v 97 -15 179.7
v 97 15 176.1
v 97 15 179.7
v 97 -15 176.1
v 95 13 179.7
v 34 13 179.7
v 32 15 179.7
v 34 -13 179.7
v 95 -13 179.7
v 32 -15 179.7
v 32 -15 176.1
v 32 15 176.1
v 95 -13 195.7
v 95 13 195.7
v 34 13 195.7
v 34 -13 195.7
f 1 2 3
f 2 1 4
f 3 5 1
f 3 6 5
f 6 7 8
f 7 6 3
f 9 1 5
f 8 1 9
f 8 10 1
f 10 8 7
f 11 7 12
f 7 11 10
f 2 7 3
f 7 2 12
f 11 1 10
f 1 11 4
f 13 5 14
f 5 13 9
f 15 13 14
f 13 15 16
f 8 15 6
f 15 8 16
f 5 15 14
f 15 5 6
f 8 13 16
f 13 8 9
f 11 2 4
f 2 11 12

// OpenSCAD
// file: ../md_vitamins.scad
// Envelopes of the bought electronics, placed where the parts expect them (for fit checks and renders)
SG90_STL = "/Users/hemangvora/OpenDuck/upstream/Open_Duck_Mini/mini_bdx/robots/open_duck_mini_v2/sg90.stl";
module v_sg90_jaw() multmatrix([[1,0,0,JAW_P[0]-5.7],[0,0,-1,-SG_BASE],[0,1,0,JAW_P[1]],[0,0,0,1]]) import(SG90_STL);
module v_radxa() {                         // Radxa Zero 3W 65 x 30 board on 6 mm standoffs + 16 mm component/wire budget
    translate([RADXA_X0, RADXA_Y0, CH_Z1 + 6]) { cube([65, 30, 1.6]); translate([2, 2, 1.6]) cube([61, 26, 16]); translate([0, 0, -2]) cube([65, 30, 2]); }
}
module v_buck() translate([-30, -13.5, CH_Z1 + 1]) cube([46, 27, 12]);            // XY-3606 (HW-688), generous envelope
module v_camera() translate([103.8, -12.5, EYE_C[1] - 14.5]) { cube([1.0, 25, 24]); translate([1.0, 12.5 - 4.25, 14.5 - 4.25]) cube([5.2, 8.5, 8.5]); }  // Pi cam v2 / IMX219 board + lens module
module v_tof() translate([103.8, -6.5, TOF_C[1] - 6.5]) { cube([1.0, 13, 13]); translate([1.0, 6.5 - 3.2, 6.5 - 1.5]) cube([1.75, 6.4, 3.0]); }
module head_vitamins() { v_sg90_jaw(); v_radxa(); v_buck(); v_camera(); v_tof(); }

// ---------------- body electronics ----------------
module v_pack()    translate([DK_X0, -PACK[1] / 2, DK_Z1]) cube(PACK);                       // 3S1P Samsung 30Q pack
module v_bms()     translate([DK_X0 + 5, -31, DK_Z1 + PACK[2] + 0.5]) cube([48, 62, 7]);      // 3S 40 A BMS, 5-FET board
module v_adapter() translate([-44, -21, SHELF[4] + 4]) { cube([33, 42, 1.6]); translate([1, 1, 1.6]) cube([31, 40, 10]); }   // Bus Servo Adapter (A)
module v_switch()  {   // AUTO MT 12 V 20 A toggle, 12 mm hole; body 28 x 16 behind the panel, cover outside
    translate([DK_X0, SWITCH_C[0] - 14, SWITCH_C[1] - 8]) cube([45, 28, 16]);
    translate([BX_R - 25, SWITCH_C[0] - 14, SWITCH_C[1] - 8]) cube([25, 28, 16]);
}
module v_xt30()    translate([DK_X0, XT30_C[0] - 5.1, XT30_C[1] - 2.6]) cube([16, 10.2, 5.2]);
module v_balance() translate([DK_X0, BAL_C[0] - 6.2, BAL_C[1] - 2.9]) cube([8, 12.4, 5.8]);
module v_caps()    for (y = [26, 33]) translate([-40, y, SHELF[4] + 5.3]) rotate([0, 90, 0]) cylinder(d = 10.2, h = 21);  // 2 x 1000 uF 25 V lying on the shelf
module body_vitamins() { v_pack(); v_bms(); v_adapter(); v_switch(); v_xt30(); v_balance(); v_caps(); }
// file: ../md_params.scad
// =====================================================================
//  Microduck-look skin for the Open Duck Mini v2 skeleton
//  Shared parameters and helpers.
//  Frame: Open Duck print/robot frame, mm. +x forward, +y left, +z up.
//  Every part is modelled where it sits on the robot (zero pose).
// =====================================================================

$fn = 72;
EPS = 0.01;

// ---------- fasteners ----------
INSERT_D   = 4.0;   // hole for M3 x 5 brass heat-set insert (Amazon B0DZ8B7FW1)
INSERT_L   = 6.0;   // hole depth for that insert
M3_CLR     = 3.4;   // M3 clearance
M3_HEAD    = 6.5;   // M3 socket-head counterbore
M3_NUT     = 6.4;   // M3 nut across corners (+clearance)
M2_TAP     = 1.8;   // M2 self-tapping pilot (SG90 tab screws, servo adapter)
M25_TAP    = 2.2;   // M2.5 self-tapping pilot (Radxa)
M2_CLR     = 2.4;

// ---------- colours (for previews only) ----------
C_WHITE = [0.95, 0.94, 0.90];
C_BLACK = [0.13, 0.13, 0.14];

// ---------- helpers ----------
function lerp(a, b, t) = a + (b - a) * t;

// Section with vertical sides from zb to zc and a superellipse cap from zc to zt.
// Points are (y, z). n = 2 gives an ellipse, larger n gives a squarer top.
function se_pts(w, zb, zc, zt, n, N = 56) =
    concat(
        [[ w, zb]],
        [for (i = [0:N]) let(t = i * 180 / N, c = cos(t), s = sin(t))
            [w * sign(c) * pow(abs(c), 2 / n), zc + (zt - zc) * pow(abs(s), 2 / n)]],
        [[-w, zb]]
    );

// st = [x, half_width, z_bottom, z_curve_start, z_top, exponent]
module station(st, inset = 0, ext = 0) {
    translate([st[0], 0, 0]) rotate([90, 0, 90])
        linear_extrude(height = EPS, center = true)
            offset(delta = -inset)
                polygon(se_pts(st[1], st[2] - ext, st[3], st[4], st[5]));
}

// piecewise loft through convex stations (hull of neighbours)
module loft(sts, inset = 0, ext = 0) {
    for (i = [0:len(sts) - 2])
        hull() { station(sts[i], inset, ext); station(sts[i + 1], inset, ext); }
}

// station parameters interpolated at any x inside the list
function st_at(sts, x) =
    let(i = max([for (k = [0:len(sts) - 2]) if (sts[k][0] <= x) k]),
        a = sts[i], b = sts[i + 1], t = (x - a[0]) / (b[0] - a[0]))
    [x, lerp(a[1], b[1], t), lerp(a[2], b[2], t), lerp(a[3], b[3], t),
        lerp(a[4], b[4], t), lerp(a[5], b[5], t)];

// heat-set insert pocket: opening at origin, going along -z by default
module insert_hole(depth = INSERT_L, d = INSERT_D) {
    translate([0, 0, -depth]) cylinder(d = d, h = depth + EPS);
    translate([0, 0, -0.6]) cylinder(d1 = d, d2 = d + 0.8, h = 0.6 + EPS);   // lead-in chamfer
}

// M3 clearance with counterbore, axis +z, counterbore at the top
module m3_cb(len_total, cb_depth) {
    translate([0, 0, -EPS]) cylinder(d = M3_CLR, h = len_total + 2 * EPS);
    translate([0, 0, len_total - cb_depth]) cylinder(d = M3_HEAD, h = cb_depth + 1);
}

module rrect(x0, x1, y0, y1, r) {
    translate([x0 + r, y0 + r]) offset(r = r) square([x1 - x0 - 2 * r, y1 - y0 - 2 * r]);
}
// main file
include <../md_params.scad>
include <../md_head.scad>
include <../md_vitamins.scad>
v_radxa();
